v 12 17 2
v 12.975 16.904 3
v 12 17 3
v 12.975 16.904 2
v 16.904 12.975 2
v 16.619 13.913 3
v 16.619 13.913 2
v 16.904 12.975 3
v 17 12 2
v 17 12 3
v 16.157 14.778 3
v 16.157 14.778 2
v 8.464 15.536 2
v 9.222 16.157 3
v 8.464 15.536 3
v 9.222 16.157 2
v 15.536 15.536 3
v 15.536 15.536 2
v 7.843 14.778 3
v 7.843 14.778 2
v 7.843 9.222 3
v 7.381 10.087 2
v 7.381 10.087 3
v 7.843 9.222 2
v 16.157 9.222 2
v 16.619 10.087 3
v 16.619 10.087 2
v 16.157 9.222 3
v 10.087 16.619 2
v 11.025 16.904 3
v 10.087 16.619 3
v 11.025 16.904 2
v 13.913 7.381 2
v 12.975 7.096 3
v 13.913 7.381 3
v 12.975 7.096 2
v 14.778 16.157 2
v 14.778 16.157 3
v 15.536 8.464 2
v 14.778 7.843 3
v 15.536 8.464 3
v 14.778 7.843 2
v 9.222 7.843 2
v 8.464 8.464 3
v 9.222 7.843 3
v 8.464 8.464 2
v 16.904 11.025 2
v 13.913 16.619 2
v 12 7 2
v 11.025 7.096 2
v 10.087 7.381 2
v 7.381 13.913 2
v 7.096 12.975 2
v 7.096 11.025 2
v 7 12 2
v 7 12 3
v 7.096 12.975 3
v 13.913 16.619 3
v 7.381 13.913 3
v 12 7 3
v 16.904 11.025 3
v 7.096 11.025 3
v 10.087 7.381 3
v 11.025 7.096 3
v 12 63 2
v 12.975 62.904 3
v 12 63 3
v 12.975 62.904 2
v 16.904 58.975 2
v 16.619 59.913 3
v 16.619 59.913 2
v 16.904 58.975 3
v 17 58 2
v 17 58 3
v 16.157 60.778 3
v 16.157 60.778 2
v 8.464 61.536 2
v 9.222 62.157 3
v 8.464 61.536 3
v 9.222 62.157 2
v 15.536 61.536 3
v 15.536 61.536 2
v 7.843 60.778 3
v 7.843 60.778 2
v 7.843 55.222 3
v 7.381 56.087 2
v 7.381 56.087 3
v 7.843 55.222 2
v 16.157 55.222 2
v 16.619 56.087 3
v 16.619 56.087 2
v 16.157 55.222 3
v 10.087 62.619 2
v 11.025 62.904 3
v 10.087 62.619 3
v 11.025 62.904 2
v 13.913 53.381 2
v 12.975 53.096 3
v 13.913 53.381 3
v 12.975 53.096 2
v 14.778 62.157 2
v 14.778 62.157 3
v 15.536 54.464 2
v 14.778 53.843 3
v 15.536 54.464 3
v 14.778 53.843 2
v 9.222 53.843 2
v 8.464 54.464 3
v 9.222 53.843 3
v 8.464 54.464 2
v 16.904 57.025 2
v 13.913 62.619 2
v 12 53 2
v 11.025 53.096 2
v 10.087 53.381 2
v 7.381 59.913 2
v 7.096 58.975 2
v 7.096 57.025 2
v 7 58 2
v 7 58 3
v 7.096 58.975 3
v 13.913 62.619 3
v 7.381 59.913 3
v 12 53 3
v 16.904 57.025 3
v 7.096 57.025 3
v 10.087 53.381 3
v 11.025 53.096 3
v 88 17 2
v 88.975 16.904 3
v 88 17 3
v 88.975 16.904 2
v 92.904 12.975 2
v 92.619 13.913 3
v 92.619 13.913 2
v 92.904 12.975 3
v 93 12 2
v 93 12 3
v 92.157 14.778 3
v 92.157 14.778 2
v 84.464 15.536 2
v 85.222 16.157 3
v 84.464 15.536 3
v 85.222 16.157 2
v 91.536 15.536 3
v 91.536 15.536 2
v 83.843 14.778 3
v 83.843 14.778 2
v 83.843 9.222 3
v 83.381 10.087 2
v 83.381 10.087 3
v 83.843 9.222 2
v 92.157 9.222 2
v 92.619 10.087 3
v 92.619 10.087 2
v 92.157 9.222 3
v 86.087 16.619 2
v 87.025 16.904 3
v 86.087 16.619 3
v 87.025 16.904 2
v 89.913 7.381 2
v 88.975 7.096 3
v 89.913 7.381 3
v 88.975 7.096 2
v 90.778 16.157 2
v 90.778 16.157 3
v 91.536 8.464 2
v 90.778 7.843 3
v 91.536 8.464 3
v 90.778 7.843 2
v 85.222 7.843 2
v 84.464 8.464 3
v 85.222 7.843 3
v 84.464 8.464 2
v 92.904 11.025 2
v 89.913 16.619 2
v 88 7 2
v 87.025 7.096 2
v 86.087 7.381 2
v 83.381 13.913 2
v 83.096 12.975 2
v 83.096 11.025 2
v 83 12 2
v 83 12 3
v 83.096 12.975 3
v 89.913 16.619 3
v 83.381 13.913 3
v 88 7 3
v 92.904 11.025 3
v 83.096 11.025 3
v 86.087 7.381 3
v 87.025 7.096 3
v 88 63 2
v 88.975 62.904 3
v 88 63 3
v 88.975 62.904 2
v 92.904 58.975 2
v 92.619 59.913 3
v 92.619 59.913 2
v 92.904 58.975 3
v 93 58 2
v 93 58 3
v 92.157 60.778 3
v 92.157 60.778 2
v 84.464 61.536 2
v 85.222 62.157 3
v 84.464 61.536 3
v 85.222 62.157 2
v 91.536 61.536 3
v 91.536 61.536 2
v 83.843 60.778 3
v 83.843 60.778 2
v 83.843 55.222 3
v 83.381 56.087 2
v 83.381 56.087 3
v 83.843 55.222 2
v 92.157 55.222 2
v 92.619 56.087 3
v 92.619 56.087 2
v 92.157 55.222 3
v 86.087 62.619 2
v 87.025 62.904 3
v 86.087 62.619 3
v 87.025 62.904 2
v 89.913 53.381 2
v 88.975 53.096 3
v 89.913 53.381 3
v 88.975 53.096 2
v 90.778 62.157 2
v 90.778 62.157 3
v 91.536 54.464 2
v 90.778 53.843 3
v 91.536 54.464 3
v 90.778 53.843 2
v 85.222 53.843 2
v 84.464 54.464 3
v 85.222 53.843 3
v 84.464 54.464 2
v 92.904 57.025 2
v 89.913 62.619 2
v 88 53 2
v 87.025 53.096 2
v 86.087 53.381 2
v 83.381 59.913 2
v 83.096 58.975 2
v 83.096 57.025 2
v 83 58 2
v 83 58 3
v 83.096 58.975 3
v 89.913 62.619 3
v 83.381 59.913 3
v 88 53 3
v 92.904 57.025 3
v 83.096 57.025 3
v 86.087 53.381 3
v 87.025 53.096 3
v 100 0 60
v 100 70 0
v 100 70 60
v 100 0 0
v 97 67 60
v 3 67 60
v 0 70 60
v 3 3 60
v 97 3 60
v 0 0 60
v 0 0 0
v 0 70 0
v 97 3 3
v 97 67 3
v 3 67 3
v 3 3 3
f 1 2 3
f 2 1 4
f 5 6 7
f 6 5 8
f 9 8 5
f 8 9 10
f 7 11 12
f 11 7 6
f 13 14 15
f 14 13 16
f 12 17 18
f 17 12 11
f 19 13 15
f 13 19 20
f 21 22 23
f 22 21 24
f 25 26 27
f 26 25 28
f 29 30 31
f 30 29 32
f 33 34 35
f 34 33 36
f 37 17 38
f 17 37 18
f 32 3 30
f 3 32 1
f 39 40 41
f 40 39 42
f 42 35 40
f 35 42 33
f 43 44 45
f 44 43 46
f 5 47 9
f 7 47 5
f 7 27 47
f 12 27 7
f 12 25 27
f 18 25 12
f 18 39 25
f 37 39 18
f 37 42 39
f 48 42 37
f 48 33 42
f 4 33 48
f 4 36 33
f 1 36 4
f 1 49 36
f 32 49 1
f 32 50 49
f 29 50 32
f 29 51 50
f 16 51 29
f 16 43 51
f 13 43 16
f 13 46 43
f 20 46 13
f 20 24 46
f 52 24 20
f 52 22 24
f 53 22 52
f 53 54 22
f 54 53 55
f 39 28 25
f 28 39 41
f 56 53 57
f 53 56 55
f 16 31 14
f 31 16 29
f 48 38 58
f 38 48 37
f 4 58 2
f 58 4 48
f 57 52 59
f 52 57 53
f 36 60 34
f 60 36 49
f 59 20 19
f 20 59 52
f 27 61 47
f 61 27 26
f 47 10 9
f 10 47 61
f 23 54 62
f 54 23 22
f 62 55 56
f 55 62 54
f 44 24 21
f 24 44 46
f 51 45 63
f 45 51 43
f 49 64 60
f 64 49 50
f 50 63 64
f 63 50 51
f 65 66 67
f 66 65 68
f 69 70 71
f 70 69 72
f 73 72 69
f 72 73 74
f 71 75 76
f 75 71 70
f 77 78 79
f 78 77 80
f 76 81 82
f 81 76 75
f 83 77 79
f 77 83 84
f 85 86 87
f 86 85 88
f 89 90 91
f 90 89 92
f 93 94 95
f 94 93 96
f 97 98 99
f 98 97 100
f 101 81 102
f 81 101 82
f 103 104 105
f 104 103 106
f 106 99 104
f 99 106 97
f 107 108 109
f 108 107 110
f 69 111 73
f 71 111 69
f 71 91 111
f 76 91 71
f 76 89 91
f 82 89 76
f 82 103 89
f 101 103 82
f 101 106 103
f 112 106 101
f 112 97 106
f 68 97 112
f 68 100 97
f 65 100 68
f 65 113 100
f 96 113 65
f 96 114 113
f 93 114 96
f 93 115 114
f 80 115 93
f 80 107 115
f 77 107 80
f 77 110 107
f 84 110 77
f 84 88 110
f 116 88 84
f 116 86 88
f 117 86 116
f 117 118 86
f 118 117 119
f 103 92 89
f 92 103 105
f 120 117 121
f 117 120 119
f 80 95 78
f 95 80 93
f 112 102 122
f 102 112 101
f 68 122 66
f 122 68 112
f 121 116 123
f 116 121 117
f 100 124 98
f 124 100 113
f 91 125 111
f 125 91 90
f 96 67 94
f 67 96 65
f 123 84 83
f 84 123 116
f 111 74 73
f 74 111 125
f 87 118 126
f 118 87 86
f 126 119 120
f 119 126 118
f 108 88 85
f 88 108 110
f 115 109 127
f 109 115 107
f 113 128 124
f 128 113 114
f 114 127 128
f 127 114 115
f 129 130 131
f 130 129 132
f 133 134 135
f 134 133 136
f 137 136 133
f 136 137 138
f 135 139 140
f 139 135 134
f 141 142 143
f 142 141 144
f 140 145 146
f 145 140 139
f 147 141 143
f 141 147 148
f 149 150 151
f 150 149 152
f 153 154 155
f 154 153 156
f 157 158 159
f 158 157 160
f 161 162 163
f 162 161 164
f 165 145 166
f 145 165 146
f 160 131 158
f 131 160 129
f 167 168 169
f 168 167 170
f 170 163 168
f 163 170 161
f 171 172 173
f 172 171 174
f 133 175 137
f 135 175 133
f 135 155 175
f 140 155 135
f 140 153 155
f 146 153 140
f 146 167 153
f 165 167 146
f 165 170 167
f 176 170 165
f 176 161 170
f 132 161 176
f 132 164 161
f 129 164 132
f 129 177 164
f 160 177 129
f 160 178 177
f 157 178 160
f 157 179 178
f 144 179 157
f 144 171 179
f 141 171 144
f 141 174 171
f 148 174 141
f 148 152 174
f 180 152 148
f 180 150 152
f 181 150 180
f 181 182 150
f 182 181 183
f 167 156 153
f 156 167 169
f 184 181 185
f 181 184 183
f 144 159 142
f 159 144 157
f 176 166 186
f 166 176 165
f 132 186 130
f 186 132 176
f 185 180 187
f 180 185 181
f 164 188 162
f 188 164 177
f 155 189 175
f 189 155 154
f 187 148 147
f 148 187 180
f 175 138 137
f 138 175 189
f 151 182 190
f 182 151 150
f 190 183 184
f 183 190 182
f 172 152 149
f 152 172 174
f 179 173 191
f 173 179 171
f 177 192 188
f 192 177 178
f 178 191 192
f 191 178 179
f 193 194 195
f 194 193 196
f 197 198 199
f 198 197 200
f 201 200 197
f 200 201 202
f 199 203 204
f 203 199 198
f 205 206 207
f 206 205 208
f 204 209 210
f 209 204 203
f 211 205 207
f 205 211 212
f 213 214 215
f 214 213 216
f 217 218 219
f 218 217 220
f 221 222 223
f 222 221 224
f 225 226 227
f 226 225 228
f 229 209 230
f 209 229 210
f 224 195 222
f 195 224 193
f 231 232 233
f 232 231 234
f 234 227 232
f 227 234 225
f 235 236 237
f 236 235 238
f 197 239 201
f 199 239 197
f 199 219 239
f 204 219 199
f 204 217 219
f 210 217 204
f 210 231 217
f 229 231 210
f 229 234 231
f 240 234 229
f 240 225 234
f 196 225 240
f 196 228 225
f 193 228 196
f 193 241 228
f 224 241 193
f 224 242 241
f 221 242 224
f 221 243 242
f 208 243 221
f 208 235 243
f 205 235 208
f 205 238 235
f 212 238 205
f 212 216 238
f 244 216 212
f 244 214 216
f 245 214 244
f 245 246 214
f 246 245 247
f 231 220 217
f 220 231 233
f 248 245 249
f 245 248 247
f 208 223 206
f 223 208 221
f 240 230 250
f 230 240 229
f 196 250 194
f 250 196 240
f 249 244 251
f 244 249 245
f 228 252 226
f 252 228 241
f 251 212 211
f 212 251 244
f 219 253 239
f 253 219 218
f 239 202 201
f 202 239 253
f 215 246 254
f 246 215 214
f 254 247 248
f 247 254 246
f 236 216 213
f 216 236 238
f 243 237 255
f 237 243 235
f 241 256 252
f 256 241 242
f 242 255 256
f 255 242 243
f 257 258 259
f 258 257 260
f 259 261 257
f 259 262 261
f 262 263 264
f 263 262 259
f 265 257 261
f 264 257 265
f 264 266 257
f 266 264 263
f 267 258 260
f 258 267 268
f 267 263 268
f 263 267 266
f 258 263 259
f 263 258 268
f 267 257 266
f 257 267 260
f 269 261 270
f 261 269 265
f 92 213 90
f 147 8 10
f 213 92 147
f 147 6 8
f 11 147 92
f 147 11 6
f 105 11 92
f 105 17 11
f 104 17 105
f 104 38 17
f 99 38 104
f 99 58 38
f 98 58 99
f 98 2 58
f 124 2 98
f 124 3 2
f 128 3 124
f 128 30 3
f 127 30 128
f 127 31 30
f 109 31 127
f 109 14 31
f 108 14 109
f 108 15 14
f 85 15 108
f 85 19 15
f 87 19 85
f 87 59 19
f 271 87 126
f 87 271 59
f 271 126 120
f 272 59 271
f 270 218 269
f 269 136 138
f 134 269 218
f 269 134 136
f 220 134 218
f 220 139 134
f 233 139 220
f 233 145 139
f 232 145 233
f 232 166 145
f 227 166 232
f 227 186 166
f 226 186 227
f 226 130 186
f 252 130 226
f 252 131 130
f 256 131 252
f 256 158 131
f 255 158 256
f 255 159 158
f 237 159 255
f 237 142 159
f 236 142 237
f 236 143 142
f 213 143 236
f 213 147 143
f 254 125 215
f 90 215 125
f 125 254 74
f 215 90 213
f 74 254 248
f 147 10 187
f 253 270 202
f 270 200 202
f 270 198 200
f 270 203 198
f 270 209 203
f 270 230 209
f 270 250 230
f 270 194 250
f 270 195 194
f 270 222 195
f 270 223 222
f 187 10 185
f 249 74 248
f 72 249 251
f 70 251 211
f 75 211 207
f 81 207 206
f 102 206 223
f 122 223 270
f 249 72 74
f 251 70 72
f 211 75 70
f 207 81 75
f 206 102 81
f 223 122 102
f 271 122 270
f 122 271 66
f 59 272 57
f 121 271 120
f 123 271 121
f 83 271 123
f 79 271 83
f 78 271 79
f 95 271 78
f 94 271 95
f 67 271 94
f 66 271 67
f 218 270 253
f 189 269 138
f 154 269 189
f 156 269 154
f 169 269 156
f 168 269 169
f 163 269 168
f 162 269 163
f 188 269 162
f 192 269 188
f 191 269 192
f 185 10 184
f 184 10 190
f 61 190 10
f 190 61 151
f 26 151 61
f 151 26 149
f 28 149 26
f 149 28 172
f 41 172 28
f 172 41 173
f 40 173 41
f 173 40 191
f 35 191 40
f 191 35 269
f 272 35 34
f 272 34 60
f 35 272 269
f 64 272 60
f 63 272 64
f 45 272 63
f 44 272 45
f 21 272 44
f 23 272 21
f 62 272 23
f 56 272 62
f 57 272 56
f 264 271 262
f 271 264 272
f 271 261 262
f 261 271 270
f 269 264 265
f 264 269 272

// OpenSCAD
$fn = 32;

// ----------------------------------------------------------------------
// Enclosure box: bosses enclosure
// ----------------------------------------------------------------------

// --- parameters (mm) ---
box_l = 100;              // outer length, X
box_w = 70;               // outer width, Y
box_h = 60;               // outer height
wall_t = 3;               // wall thickness
boss_r = 5;               // corner boss radius
hole_r = 1.5;             // boss screw hole radius
boss_in = 12;             // boss inset from the corners
fit_tol = 0.1;            // tolerance for press fits, mm
free_tol = 0.3;           // tolerance for clearance fits, mm

inner_h = box_h - wall_t;  // cavity depth
boss_h = inner_h - 2;  // corner boss height

difference() {
  cube([box_l, box_w, box_h]);
  translate([wall_t, wall_t, wall_t])
    cube([box_l - 2 * wall_t, box_w - 2 * wall_t, box_h]);
  for (sx = [0, 1], sy = [0, 1])
    translate([sx ? box_l - boss_in : boss_in,
               sy ? box_w - boss_in : boss_in, wall_t - 1]) {
      cylinder(r = boss_r, h = boss_h);
      translate([0, 0, boss_h - 4])
        cylinder(r = hole_r, h = 5);
    }
}
